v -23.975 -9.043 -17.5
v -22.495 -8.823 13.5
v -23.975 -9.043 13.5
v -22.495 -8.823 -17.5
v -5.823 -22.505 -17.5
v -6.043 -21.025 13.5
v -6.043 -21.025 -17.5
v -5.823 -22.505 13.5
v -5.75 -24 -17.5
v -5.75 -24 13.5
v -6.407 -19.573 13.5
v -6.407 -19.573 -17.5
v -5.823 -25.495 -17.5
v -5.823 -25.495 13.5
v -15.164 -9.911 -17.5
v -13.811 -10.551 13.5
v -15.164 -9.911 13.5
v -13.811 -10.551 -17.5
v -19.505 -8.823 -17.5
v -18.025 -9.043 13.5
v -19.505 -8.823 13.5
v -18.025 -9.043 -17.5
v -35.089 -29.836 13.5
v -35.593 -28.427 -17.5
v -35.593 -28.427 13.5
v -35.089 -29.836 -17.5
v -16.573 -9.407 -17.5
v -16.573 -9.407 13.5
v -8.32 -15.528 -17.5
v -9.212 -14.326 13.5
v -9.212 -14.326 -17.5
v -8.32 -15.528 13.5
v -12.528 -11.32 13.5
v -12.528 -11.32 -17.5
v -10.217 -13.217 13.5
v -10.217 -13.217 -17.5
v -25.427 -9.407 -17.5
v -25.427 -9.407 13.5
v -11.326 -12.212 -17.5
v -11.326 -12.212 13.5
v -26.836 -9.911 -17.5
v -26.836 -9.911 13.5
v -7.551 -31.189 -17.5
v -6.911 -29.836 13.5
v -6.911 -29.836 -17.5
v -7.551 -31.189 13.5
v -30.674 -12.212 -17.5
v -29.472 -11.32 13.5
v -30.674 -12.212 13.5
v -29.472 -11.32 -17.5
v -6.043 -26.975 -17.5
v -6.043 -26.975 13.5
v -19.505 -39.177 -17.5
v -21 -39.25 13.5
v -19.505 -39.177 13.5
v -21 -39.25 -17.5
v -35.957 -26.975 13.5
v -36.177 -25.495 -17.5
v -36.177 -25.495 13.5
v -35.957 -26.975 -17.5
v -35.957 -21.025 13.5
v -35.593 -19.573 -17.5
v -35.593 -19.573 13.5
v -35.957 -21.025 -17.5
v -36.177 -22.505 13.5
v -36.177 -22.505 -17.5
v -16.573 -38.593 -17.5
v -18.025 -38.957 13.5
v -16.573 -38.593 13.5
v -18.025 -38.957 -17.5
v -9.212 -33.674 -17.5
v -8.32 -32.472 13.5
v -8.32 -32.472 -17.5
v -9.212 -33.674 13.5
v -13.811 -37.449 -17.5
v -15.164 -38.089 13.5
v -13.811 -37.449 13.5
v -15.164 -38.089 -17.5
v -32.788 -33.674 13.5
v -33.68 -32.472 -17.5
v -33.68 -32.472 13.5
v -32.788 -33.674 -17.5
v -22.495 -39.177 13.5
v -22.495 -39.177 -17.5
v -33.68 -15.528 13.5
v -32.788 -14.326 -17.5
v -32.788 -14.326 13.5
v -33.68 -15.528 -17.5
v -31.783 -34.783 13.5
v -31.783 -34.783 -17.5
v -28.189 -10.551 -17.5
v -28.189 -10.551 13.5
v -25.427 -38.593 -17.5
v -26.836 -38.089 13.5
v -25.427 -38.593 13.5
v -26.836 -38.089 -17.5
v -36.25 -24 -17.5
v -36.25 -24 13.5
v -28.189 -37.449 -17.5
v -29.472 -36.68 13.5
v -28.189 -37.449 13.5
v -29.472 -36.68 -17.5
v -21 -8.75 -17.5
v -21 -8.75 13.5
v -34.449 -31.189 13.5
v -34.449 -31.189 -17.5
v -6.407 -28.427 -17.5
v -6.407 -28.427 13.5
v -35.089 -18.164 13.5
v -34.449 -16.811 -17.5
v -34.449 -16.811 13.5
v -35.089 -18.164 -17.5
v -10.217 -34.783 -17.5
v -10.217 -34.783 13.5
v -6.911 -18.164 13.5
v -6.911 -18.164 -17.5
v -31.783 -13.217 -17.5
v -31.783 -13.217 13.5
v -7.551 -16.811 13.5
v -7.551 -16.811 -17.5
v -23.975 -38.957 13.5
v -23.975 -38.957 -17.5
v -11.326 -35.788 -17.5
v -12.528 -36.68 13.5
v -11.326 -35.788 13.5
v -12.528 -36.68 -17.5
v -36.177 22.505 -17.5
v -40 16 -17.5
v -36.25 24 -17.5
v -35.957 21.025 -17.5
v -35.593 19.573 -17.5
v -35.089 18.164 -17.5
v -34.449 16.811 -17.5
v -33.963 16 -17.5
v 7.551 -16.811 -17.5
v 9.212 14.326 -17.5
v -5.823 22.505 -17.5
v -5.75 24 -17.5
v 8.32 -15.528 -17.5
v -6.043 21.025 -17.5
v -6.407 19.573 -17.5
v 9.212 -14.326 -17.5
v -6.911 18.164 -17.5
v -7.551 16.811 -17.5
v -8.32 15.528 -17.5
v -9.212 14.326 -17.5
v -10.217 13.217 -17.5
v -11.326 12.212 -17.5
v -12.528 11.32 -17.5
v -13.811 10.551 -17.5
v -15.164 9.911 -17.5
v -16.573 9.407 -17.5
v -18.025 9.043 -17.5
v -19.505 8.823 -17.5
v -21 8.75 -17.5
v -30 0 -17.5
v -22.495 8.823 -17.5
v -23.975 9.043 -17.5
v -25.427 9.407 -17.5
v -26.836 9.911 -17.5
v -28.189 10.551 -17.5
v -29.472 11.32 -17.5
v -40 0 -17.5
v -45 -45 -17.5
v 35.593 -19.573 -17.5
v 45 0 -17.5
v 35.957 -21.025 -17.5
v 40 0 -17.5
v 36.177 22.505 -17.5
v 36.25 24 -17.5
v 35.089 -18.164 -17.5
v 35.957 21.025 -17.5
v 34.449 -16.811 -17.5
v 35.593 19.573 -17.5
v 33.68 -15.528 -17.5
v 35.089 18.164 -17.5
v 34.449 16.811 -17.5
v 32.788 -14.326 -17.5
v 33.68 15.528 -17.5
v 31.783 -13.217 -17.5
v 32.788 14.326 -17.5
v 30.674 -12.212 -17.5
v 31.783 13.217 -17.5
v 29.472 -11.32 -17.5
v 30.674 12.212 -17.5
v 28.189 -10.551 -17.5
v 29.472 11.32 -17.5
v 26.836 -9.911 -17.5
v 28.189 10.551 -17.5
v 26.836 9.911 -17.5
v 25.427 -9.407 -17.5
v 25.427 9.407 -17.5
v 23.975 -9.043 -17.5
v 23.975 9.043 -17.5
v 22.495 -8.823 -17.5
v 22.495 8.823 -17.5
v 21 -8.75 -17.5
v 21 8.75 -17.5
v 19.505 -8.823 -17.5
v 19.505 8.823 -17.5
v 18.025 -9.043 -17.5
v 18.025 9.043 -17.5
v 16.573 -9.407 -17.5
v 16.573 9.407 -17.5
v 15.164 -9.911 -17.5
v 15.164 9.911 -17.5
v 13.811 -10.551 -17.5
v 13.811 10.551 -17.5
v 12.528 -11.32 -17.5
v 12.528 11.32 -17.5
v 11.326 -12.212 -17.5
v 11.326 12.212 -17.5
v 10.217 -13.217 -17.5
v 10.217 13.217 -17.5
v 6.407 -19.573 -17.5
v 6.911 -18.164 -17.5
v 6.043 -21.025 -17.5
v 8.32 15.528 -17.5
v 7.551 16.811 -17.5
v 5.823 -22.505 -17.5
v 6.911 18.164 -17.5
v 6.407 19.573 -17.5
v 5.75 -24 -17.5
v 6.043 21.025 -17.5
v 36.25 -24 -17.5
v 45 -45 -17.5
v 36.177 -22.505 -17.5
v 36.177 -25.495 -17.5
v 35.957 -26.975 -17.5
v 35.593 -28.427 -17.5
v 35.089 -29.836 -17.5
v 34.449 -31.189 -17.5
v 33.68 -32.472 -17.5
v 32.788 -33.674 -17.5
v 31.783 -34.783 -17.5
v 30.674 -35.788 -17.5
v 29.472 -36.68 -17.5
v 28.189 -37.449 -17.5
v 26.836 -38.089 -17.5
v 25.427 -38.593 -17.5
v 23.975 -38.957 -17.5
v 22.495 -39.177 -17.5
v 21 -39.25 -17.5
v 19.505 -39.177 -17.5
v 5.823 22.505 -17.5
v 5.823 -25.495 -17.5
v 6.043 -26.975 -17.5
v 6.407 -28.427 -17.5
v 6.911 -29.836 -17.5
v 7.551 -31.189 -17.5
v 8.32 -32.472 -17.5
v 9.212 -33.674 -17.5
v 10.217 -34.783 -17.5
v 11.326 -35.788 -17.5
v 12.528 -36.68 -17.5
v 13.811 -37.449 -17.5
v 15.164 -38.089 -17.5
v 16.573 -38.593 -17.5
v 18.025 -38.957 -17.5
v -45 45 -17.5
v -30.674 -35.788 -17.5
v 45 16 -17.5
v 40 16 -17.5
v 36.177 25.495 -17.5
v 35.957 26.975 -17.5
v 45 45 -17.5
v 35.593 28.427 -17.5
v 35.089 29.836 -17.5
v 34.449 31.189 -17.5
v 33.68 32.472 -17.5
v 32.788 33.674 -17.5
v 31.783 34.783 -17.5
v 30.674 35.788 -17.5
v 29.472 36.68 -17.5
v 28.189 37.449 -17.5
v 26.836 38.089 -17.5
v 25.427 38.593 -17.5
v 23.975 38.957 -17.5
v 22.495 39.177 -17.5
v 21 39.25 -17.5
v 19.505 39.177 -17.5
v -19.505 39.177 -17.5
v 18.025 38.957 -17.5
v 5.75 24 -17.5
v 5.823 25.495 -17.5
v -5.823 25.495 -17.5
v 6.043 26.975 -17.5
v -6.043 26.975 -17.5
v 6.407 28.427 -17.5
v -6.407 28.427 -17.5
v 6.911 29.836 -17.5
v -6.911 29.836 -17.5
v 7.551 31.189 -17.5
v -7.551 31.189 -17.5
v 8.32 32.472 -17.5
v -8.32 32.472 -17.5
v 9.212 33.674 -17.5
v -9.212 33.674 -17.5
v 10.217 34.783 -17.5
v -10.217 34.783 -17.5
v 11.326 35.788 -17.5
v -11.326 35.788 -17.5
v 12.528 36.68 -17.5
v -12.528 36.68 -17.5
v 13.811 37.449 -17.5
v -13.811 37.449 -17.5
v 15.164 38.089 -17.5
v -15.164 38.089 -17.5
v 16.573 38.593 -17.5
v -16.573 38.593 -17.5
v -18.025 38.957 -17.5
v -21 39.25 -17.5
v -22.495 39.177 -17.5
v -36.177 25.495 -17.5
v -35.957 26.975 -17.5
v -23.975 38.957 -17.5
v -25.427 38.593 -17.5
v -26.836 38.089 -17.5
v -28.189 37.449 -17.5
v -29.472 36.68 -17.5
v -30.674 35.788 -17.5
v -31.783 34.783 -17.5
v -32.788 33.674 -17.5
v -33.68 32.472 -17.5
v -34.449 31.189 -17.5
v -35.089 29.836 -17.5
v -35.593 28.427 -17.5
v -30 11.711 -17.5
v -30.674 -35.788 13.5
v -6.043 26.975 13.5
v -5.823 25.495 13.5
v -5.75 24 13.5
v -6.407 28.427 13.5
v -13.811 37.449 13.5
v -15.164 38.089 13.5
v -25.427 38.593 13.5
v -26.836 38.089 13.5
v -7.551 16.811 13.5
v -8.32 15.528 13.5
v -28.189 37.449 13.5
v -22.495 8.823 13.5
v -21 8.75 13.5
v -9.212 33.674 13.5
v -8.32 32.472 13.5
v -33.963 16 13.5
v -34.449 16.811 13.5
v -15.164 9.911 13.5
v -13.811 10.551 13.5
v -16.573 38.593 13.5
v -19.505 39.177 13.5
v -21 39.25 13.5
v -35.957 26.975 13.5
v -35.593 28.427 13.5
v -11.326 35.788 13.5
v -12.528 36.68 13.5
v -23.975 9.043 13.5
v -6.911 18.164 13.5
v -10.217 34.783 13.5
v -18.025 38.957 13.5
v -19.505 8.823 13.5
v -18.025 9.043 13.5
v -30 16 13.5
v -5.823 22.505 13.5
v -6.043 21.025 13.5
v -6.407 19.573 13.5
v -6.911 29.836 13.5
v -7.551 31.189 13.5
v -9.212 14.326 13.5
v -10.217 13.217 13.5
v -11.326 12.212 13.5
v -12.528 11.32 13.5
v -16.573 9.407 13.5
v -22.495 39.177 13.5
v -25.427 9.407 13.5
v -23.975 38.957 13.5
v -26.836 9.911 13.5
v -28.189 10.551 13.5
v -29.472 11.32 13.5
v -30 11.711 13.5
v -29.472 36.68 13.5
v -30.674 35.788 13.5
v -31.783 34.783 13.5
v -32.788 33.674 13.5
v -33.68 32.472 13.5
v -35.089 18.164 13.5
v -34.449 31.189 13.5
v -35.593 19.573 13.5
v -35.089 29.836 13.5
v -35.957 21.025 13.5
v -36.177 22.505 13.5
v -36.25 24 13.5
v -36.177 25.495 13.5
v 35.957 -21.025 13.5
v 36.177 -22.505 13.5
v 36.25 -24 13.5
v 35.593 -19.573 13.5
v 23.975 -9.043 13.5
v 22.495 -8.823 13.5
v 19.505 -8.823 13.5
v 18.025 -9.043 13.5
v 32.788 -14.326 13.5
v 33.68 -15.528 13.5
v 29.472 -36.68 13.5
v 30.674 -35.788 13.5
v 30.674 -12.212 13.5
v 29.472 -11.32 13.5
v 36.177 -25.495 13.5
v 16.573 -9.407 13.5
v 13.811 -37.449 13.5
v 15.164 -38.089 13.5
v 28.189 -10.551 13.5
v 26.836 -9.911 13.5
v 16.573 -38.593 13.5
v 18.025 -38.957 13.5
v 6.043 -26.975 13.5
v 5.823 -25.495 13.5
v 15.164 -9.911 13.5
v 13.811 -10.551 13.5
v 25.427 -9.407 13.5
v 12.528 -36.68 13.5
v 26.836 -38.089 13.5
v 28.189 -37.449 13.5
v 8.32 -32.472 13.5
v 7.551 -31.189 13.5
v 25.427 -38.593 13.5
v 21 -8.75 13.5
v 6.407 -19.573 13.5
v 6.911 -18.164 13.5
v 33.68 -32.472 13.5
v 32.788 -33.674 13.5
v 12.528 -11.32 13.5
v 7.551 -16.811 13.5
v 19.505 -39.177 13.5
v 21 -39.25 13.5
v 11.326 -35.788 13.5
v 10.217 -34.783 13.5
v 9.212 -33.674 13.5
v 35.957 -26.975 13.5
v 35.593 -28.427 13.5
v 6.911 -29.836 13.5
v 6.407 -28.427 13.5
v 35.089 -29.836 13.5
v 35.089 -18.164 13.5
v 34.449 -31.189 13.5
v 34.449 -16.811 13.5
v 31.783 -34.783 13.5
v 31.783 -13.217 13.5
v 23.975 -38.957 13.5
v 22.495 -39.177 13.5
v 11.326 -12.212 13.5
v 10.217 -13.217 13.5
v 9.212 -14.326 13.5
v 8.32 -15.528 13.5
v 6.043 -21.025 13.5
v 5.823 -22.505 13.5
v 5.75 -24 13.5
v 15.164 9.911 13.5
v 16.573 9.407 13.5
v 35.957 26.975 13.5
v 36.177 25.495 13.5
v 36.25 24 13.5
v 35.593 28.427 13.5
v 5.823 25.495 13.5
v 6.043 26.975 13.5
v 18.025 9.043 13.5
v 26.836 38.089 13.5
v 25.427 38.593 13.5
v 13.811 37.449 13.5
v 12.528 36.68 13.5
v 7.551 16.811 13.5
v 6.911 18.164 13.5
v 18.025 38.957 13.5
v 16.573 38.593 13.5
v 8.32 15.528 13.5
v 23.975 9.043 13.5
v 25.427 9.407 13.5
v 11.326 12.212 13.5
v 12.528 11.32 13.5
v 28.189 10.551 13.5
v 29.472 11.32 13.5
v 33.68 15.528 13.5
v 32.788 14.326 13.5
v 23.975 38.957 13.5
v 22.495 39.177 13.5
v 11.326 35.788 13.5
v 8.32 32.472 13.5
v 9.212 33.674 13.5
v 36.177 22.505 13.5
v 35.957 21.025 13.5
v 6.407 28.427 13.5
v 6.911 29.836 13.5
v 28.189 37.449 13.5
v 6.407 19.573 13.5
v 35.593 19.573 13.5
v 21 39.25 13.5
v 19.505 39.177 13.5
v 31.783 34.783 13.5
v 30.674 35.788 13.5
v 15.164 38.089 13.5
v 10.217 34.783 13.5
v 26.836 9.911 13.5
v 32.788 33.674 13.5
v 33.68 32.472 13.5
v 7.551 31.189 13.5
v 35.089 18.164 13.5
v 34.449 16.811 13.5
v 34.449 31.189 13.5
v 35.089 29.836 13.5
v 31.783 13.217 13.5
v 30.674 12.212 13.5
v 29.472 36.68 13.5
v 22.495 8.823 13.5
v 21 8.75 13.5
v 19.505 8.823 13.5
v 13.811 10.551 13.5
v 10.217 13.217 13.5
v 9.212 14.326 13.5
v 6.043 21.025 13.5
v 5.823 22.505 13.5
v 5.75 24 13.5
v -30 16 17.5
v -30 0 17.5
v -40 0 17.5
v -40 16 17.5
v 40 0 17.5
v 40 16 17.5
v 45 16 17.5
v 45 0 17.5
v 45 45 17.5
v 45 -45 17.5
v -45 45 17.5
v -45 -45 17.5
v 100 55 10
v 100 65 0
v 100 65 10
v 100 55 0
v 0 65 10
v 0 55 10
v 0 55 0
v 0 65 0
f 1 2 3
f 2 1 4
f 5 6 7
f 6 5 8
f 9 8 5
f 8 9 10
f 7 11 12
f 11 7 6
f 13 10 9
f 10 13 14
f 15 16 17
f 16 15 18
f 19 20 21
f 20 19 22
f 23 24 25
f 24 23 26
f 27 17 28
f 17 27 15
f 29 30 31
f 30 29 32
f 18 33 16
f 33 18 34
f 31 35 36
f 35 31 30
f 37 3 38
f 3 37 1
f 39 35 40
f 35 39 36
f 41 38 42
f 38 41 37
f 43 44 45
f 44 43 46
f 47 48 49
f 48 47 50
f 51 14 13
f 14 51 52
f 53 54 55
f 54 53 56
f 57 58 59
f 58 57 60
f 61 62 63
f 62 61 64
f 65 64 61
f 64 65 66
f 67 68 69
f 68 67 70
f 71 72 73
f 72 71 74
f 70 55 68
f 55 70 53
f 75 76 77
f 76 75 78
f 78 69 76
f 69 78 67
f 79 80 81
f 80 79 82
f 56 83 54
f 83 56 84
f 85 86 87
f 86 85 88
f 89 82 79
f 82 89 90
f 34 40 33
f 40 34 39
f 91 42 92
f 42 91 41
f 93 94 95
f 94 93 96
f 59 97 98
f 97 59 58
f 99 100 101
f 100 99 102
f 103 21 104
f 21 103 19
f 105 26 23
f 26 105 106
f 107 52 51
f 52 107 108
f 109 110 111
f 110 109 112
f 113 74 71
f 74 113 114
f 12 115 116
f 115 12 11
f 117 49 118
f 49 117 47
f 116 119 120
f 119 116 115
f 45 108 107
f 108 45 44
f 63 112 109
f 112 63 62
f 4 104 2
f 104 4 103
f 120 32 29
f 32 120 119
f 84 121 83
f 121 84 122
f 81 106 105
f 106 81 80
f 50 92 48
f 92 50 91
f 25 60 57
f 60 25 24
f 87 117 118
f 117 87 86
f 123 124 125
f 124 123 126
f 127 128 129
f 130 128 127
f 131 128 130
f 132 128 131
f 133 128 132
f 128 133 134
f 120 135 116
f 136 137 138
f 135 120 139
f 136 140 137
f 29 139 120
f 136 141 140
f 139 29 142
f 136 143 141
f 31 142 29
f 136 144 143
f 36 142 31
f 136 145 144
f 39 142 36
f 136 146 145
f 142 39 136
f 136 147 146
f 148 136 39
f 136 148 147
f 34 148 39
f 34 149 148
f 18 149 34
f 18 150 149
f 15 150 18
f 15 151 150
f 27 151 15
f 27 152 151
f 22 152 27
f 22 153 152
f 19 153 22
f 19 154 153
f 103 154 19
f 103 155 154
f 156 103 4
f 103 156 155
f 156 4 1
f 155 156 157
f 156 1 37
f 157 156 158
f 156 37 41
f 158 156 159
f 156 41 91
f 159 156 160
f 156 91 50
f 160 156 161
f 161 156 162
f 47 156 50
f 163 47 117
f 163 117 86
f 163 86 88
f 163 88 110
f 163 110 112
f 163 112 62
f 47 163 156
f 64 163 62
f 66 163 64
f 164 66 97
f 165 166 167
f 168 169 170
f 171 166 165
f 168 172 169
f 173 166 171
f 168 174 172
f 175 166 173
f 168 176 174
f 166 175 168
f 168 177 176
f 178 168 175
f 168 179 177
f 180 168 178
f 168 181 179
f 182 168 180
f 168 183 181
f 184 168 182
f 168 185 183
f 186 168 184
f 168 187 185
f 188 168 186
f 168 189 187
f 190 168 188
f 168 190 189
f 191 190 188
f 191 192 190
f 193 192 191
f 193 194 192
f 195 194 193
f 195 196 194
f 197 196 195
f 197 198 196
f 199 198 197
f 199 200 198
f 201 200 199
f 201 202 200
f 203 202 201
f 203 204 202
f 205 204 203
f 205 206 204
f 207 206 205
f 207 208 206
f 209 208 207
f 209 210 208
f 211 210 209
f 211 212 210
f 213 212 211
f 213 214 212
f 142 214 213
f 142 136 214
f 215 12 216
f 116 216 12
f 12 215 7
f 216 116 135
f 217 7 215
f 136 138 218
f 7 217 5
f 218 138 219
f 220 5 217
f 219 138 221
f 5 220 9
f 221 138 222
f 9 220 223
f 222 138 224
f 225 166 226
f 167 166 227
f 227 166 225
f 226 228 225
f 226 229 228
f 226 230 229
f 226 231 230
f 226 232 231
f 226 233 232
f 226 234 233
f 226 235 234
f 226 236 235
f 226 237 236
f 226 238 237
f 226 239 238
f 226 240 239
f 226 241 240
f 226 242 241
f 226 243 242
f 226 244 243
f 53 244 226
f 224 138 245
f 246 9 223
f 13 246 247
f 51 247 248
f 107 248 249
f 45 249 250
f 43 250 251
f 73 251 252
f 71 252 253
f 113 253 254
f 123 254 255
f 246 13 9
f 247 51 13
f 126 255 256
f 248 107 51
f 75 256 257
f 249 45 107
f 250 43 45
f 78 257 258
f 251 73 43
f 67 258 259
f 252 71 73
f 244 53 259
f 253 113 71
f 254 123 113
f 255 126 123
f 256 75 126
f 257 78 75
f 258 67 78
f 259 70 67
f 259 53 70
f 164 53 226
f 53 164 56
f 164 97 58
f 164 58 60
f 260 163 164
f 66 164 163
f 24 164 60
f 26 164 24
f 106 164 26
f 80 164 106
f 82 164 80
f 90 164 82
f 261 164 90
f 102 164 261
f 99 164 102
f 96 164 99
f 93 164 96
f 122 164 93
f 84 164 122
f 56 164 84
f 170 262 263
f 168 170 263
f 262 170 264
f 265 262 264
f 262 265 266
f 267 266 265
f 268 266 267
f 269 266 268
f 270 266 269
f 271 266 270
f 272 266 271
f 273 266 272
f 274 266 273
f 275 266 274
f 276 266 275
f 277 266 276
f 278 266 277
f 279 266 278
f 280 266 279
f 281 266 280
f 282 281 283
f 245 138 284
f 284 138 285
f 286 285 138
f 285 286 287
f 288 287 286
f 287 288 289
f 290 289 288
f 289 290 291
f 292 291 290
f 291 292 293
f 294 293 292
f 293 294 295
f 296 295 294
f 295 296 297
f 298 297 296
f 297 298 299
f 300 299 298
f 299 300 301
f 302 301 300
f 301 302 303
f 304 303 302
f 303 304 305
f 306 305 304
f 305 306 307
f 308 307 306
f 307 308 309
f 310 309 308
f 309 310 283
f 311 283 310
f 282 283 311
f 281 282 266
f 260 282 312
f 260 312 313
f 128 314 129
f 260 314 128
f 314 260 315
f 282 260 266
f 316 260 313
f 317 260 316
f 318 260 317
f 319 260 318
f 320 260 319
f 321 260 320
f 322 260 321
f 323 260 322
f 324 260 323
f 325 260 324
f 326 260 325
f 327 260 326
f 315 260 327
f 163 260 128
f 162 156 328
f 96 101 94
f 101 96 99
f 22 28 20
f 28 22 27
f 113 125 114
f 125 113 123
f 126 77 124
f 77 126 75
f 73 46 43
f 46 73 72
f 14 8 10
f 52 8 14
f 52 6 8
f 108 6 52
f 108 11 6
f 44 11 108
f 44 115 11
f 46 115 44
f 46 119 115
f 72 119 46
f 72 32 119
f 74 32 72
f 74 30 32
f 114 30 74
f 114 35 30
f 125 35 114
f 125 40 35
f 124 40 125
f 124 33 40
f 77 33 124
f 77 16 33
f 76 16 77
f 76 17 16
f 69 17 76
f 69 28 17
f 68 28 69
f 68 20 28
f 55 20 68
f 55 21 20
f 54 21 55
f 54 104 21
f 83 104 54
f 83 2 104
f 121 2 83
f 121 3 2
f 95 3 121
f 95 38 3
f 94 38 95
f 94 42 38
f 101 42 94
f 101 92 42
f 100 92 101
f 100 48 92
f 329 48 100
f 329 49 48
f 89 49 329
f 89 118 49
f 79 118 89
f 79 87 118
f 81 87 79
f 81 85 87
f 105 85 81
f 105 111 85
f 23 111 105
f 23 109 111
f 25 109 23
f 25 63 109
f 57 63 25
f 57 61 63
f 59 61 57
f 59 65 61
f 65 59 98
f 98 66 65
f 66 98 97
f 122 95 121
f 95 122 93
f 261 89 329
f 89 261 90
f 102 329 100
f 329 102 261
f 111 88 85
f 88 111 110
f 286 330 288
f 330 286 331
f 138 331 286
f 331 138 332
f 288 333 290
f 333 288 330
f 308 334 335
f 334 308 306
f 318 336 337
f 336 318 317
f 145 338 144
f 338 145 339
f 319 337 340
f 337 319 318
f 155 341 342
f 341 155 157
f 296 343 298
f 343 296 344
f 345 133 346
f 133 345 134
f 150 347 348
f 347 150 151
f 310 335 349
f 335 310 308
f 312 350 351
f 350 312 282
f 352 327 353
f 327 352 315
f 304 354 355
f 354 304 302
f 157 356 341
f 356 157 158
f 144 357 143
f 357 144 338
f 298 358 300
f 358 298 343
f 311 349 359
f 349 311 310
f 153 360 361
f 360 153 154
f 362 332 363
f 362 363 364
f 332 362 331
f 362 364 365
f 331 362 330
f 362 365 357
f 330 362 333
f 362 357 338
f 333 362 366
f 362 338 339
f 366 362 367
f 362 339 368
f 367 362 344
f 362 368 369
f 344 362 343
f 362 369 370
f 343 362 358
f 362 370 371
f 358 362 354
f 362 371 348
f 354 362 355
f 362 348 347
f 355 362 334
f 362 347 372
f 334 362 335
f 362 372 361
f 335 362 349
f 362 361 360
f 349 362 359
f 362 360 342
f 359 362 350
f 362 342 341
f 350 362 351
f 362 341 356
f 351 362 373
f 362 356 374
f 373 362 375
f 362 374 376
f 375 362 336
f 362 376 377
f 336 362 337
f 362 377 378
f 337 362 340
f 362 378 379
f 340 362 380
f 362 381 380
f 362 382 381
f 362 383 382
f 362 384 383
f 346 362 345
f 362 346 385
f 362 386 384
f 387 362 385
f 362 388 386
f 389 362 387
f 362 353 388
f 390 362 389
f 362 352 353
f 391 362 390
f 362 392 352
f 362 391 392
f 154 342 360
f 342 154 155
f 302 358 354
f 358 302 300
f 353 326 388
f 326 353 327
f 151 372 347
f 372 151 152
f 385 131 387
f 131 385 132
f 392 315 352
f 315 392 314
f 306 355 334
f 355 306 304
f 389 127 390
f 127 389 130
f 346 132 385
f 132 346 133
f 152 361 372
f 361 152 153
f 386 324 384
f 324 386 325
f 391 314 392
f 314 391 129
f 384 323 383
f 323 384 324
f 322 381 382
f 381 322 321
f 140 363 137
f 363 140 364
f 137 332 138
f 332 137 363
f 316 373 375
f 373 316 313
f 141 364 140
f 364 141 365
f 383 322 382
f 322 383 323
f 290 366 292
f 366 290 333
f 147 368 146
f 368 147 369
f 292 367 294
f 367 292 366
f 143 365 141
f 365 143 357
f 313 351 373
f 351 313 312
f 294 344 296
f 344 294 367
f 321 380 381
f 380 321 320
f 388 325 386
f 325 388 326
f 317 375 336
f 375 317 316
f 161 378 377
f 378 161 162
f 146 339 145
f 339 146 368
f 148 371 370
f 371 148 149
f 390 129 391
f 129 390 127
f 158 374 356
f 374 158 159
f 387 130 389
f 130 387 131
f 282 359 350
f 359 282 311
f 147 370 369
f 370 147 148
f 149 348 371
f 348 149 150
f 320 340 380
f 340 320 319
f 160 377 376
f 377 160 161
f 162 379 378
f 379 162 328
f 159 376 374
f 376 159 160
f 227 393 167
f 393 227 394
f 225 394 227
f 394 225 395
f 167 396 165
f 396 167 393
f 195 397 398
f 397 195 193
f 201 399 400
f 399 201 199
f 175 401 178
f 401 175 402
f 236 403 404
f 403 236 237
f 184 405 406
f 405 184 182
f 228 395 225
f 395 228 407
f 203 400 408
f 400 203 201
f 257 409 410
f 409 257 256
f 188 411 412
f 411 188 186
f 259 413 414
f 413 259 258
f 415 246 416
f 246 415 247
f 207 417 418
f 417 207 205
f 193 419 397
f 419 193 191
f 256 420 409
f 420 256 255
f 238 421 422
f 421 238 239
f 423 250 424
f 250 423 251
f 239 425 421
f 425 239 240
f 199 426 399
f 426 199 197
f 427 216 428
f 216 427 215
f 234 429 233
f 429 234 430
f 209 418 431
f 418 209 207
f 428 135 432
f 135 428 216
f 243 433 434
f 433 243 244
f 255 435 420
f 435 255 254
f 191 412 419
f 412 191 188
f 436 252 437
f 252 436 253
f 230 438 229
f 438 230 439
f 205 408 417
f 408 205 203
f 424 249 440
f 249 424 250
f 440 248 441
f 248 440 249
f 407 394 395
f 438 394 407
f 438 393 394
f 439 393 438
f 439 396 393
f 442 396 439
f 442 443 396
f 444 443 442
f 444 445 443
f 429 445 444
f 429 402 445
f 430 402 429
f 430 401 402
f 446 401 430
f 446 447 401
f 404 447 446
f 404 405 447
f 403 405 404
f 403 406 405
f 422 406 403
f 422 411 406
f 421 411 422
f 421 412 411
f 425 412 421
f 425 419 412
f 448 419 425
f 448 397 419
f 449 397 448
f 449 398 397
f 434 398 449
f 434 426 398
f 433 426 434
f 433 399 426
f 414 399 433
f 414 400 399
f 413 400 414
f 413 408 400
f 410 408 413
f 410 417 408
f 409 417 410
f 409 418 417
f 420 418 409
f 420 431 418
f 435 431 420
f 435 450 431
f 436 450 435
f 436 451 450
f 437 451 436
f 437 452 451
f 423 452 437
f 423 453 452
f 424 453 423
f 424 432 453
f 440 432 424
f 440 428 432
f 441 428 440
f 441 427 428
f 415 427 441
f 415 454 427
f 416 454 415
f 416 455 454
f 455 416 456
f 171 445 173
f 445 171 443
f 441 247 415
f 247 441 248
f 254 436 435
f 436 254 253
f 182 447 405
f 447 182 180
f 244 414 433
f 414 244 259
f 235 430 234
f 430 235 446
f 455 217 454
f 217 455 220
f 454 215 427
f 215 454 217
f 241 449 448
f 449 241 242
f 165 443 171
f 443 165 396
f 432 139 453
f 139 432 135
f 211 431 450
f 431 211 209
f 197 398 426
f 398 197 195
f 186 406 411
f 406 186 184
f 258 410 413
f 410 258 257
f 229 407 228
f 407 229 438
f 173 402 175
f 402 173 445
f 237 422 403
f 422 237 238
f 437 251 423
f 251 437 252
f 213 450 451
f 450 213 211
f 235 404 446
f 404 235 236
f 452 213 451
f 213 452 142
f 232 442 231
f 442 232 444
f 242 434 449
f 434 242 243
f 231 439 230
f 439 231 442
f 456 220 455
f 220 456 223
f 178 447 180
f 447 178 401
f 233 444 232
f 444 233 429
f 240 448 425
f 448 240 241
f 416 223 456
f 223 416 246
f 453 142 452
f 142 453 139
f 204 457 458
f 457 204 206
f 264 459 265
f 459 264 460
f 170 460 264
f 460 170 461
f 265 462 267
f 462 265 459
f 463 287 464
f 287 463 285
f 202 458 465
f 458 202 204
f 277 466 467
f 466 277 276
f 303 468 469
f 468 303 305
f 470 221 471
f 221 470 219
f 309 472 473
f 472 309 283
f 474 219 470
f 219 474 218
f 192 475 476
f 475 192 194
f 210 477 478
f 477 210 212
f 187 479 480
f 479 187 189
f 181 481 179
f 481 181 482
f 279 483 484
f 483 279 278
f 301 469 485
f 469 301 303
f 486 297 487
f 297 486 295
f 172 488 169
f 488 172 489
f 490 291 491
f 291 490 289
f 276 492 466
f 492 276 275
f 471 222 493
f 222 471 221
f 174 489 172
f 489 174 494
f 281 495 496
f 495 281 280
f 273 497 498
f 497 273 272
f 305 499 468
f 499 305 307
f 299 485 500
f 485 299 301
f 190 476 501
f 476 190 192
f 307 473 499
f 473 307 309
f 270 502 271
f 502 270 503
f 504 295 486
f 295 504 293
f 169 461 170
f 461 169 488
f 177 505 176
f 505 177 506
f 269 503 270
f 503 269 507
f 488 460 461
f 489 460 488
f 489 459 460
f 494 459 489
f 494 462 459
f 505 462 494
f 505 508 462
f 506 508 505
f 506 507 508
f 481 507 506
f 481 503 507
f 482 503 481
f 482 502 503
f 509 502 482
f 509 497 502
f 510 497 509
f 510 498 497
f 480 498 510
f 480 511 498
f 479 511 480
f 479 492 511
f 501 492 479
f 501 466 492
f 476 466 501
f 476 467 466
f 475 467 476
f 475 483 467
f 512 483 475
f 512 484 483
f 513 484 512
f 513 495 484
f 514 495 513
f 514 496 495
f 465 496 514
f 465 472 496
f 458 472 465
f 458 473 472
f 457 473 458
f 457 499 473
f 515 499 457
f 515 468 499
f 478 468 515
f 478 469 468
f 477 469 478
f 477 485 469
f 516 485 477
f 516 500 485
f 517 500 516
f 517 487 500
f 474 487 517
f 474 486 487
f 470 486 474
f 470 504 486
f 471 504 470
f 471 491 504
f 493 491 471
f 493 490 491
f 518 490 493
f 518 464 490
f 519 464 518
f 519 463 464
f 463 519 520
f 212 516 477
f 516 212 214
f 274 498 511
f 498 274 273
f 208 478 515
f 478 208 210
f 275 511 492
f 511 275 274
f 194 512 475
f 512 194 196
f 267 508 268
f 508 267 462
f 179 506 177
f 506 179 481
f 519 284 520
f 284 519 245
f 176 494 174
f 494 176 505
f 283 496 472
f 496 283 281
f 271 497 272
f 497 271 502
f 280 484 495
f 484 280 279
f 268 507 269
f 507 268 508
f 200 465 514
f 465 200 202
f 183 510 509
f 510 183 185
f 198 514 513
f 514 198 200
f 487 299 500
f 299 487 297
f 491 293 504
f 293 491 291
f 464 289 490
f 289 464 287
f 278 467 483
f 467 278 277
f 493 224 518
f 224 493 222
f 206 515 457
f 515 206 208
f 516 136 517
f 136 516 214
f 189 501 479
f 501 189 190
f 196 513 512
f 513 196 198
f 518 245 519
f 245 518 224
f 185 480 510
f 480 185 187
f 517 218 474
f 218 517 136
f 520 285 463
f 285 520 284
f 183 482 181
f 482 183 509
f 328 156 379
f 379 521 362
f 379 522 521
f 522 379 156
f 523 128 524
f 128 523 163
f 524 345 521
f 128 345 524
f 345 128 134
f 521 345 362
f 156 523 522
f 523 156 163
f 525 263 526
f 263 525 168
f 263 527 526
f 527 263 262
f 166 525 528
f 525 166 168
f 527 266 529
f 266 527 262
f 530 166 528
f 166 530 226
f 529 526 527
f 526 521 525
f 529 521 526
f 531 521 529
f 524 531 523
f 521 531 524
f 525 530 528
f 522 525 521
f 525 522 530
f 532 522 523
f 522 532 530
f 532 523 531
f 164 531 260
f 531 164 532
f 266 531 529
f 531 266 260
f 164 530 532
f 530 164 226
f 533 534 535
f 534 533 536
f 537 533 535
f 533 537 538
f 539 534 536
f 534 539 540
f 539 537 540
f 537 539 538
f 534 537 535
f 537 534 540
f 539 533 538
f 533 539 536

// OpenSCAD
// Dimensions for Part 1: Base Block
base_x = 90;
base_y = 90;
base_z = 35;

// Dimensions for Part 1: Tube Seats
seat_dia = 30.5;
seat_depth = 30;
seat_floor = 5; // base_z - seat_depth
seat_x_pos = 21;
seat_y_pos = 24;

// Dimensions for Part 1: Posts
post_x = 10;
post_y = 16;
post_z = 160;
post_hole_x = 10.4;
post_hole_y = 10.4;
post_hole_z = 150;

// Dimensions for Part 2: Handle
handle_x = 100;
handle_y = 10;
handle_z = 10;
handle_y_start = 55;
handle_y_end = 65;

// Global settings
$fn = 64;

// --- Part 1: Base Block ---
// Centered on origin in X and Y, resting on z=0
difference() {
    // Main base block
    cube([base_x, base_y, base_z], center = true);
    
    // Four blind seats for 50 mL tubes
    for (sx = [-seat_x_pos, seat_x_pos]) {
        for (sy = [-seat_y_pos, seat_y_pos]) {
            translate([sx, sy, -base_z/2]) {
                cylinder(r = seat_dia / 2, h = seat_depth + 1, center = false);
            }
        }
    }
    
    // Two posts
    for (px = [-base_x/2 + post_x/2, base_x/2 - post_x/2]) {
        translate([px, 0, -base_z/2]) {
            cube([post_x, post_y, post_z], center = false);
            
            // Square hole through post along X axis
            // Hole is centered at z=150 relative to base bottom.
            // Post starts at z=0 (relative to base bottom).
            // So hole center is at z=150.
            // Hole extends 10.4mm in Y and 10.4mm in Z.
            translate([post_x/2, -post_hole_y/2, post_hole_z - post_hole_y/2]) {
                cube([post_x + 1, post_hole_y, post_hole_y + 1], center = false);
            }
        }
    }
}

// --- Part 2: Handle ---
// Lying on the bed along X, centred on x = 0
// Spans y = 55 to 65
translate([0, handle_y_start, 0]) {
    cube([handle_x, handle_y, handle_z], center = false);
}
